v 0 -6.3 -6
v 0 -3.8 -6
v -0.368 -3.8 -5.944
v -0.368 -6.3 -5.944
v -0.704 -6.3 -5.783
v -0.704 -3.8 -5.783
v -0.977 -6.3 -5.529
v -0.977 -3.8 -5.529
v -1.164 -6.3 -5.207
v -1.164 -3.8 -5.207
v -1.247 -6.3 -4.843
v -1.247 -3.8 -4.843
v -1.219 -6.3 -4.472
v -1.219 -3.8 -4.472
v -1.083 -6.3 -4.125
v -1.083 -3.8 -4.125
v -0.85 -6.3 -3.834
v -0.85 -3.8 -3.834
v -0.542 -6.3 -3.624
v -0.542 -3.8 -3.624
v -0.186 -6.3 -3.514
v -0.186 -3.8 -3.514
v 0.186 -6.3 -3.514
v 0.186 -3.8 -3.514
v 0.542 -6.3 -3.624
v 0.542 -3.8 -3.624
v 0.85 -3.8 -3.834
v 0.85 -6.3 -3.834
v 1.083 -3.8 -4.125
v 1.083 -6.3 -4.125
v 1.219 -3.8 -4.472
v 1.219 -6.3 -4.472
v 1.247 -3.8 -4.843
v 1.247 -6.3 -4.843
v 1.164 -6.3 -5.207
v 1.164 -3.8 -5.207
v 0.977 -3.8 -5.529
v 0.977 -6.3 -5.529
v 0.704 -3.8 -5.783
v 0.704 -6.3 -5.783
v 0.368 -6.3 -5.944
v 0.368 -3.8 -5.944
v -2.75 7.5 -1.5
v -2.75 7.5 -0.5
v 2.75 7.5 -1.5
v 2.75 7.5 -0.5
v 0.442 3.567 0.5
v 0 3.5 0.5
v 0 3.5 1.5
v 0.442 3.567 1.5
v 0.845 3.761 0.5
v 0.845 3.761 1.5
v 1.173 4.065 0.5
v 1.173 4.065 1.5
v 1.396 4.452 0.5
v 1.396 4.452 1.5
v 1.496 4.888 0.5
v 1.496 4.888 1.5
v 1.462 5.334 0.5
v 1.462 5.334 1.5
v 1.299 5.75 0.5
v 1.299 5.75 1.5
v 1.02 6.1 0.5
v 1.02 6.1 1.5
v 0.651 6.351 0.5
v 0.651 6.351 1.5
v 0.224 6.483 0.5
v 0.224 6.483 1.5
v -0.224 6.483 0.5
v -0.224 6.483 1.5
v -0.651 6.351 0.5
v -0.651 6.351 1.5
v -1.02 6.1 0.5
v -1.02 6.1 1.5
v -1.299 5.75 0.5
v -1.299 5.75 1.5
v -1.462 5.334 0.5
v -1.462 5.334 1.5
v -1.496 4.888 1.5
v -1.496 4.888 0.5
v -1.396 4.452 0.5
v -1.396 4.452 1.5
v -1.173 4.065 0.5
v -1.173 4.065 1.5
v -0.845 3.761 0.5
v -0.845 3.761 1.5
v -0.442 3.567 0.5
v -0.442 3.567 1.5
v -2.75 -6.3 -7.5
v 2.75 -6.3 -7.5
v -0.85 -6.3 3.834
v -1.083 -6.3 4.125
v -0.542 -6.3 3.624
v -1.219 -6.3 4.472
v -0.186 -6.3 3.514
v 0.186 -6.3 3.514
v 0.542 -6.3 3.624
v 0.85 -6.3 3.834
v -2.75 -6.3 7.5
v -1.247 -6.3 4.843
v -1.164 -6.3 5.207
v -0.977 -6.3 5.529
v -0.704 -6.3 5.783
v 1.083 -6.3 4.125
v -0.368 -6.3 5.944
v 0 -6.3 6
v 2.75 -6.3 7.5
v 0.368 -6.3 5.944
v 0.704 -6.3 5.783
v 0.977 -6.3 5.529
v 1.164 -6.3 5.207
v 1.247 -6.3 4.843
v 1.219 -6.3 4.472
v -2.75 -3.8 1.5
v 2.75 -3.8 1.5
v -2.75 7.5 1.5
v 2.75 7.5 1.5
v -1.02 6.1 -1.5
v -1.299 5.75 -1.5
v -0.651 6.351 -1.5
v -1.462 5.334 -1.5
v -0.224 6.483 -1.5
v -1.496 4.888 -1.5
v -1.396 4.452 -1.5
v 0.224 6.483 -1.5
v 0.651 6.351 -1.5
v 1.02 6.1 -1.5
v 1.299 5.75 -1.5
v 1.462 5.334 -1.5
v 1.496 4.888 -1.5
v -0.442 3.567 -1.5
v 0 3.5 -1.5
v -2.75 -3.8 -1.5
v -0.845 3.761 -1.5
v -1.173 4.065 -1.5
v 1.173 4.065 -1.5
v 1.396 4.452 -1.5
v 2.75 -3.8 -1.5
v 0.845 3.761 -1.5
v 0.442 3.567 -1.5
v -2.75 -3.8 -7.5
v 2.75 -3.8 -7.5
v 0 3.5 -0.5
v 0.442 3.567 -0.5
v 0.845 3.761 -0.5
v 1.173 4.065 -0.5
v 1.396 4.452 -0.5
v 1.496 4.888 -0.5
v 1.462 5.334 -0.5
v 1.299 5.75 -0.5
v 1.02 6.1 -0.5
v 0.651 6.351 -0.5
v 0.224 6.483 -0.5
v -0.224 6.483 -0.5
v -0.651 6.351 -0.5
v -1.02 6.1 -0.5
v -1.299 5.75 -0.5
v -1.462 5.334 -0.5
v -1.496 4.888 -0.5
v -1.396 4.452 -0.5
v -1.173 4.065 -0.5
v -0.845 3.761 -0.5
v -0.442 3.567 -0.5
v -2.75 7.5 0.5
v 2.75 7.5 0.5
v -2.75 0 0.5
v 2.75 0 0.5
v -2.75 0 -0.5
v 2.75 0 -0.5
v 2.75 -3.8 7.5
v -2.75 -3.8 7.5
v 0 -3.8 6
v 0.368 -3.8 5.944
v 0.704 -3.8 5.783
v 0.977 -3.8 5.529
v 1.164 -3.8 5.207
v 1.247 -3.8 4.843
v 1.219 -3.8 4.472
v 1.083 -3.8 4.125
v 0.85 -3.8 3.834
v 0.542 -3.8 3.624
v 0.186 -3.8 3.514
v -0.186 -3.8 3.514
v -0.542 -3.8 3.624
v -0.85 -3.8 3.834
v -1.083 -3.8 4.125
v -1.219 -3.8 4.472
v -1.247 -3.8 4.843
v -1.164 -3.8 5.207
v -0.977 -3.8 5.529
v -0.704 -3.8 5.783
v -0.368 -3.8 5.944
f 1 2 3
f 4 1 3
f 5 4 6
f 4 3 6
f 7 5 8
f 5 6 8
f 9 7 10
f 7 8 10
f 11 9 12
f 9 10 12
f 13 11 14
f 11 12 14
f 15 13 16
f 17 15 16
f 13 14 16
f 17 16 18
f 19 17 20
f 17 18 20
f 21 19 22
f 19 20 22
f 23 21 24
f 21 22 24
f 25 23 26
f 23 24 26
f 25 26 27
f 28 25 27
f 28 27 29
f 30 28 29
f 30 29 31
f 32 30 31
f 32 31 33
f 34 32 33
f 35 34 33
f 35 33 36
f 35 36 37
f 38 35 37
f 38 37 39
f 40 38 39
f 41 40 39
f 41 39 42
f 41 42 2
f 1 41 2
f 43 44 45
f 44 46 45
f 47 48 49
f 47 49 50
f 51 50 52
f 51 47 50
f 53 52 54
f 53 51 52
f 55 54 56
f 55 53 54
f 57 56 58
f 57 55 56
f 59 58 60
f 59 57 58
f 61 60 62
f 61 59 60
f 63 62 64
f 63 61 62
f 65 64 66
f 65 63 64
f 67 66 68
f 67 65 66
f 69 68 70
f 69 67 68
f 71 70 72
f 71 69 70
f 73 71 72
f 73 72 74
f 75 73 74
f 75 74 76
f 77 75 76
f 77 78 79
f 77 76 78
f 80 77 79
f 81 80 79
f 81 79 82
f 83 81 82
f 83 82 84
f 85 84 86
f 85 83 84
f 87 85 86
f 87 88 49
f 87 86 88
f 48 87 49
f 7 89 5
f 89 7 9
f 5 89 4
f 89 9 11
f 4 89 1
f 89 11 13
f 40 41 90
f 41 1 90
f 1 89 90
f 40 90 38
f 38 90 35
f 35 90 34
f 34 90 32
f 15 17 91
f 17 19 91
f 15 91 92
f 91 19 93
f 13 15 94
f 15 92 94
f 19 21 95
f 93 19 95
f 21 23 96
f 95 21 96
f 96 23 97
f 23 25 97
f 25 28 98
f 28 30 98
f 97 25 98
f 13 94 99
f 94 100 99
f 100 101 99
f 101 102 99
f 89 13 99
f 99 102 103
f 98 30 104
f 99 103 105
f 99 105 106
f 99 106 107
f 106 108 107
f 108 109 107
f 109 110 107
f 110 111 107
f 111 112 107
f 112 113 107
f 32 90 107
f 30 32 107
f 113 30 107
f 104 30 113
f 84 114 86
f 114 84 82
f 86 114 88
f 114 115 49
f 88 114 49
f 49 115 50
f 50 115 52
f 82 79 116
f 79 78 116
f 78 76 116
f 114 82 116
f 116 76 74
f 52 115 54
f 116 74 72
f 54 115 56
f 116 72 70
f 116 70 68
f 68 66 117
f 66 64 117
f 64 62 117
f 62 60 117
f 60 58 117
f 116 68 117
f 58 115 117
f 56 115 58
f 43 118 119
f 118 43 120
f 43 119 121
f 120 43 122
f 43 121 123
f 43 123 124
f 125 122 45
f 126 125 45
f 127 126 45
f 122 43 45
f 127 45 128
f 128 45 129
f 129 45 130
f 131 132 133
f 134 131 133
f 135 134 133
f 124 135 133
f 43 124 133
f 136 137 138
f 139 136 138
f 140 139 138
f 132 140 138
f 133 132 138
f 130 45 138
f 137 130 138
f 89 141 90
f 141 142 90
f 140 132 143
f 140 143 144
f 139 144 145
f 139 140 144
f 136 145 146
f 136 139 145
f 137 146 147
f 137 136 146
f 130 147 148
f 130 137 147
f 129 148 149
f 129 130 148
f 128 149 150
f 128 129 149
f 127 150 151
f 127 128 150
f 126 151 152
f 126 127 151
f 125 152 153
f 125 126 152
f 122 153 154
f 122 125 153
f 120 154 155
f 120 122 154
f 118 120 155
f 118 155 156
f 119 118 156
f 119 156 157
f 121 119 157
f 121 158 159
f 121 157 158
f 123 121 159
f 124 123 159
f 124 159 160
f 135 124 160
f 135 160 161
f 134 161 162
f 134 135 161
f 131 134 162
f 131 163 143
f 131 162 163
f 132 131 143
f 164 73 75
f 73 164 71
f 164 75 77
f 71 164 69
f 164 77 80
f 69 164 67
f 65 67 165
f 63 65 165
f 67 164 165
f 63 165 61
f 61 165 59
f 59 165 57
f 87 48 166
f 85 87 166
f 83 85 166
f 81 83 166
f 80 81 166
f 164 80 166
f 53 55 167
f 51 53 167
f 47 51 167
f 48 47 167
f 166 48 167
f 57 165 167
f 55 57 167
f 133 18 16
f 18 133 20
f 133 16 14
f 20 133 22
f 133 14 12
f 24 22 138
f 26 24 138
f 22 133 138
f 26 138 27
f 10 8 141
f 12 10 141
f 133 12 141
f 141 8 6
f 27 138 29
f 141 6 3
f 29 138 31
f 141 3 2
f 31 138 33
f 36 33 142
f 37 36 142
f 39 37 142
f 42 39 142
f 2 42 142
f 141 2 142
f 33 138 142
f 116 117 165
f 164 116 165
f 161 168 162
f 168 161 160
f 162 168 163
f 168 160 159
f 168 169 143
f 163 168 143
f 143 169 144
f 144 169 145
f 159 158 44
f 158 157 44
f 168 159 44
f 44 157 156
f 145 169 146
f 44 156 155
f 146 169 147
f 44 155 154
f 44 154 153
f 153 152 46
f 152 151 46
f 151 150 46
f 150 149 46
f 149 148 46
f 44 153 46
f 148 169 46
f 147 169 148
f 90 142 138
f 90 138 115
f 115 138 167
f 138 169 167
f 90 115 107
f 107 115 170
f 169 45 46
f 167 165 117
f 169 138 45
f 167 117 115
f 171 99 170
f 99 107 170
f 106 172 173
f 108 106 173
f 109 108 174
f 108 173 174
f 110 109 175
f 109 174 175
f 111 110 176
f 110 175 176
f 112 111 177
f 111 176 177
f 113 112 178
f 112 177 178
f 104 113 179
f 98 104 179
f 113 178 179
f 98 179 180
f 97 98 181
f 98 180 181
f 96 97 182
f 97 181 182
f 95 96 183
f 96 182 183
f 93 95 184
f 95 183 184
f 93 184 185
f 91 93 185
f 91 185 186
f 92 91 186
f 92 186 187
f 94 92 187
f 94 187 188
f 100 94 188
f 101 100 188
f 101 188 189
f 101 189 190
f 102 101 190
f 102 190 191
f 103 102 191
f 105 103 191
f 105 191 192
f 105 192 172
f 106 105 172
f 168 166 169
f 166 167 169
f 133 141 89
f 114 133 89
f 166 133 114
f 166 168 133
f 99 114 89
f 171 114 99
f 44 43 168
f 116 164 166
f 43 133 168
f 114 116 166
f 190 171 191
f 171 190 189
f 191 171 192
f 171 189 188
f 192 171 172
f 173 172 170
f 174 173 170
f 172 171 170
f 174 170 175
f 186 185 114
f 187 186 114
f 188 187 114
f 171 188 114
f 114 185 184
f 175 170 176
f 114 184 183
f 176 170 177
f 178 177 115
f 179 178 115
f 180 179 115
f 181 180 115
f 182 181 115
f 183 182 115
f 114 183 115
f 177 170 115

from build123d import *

# Parameters (mm, degrees)
BOSS_EXTRUDE1_DEPTH     = 2.75
SKETCH2_R               = 1.25
CUT_EXTRUDE1_DEPTH      = 14.838442831
CUT_EXTRUDE2_DEPTH      = 11.9573035
CUT_EXTRUDE2_DEPTH_BACK = 11.9573035
SKETCH4_R               = 1.5


with BuildPart() as part:
    # Sketch1 → Boss-Extrude1 (new, symmetric)
    with BuildSketch(Plane(origin=(0, 0, 0), x_dir=(0, 0, -1), z_dir=(1, 0, 0))):
        Polygon((-0.5, 7.5), (-0.5, 0), (0.5, 0), (0.5, 7.5), (1.5, 7.5), (1.5, -3.8), (7.5, -3.8), (7.5, -6.3), (-7.5, -6.3), (-7.5, -3.8), (-1.5, -3.8), (-1.5, 7.5), align=None)
    extrude(amount=BOSS_EXTRUDE1_DEPTH, both=True)

    # Sketch2 → Cut-Extrude1 (cut, through all)
    with BuildSketch(Plane(origin=(0, -3.8, 0), x_dir=(1, 0, 0), z_dir=(0, 1, 0))):
        with Locations(Location((0, -4.75, 0), (0, 0, 270))):
            Circle(SKETCH2_R)
        with Locations(Location((0, 4.75, 0), (0, 0, 90))):
            Circle(SKETCH2_R)
    extrude(amount=-CUT_EXTRUDE1_DEPTH, mode=Mode.SUBTRACT)

    # Sketch4 → Cut-Extrude2 (cut, two sides: drawn at the far end of the back side and taken through both)
    with BuildSketch(Plane.XY.offset(-CUT_EXTRUDE2_DEPTH_BACK)):
        with Locations(Location((0, 5, 0), (0, 0, 270))):
            Circle(SKETCH4_R)
    extrude(amount=CUT_EXTRUDE2_DEPTH + CUT_EXTRUDE2_DEPTH_BACK, mode=Mode.SUBTRACT)


solid = part.part
